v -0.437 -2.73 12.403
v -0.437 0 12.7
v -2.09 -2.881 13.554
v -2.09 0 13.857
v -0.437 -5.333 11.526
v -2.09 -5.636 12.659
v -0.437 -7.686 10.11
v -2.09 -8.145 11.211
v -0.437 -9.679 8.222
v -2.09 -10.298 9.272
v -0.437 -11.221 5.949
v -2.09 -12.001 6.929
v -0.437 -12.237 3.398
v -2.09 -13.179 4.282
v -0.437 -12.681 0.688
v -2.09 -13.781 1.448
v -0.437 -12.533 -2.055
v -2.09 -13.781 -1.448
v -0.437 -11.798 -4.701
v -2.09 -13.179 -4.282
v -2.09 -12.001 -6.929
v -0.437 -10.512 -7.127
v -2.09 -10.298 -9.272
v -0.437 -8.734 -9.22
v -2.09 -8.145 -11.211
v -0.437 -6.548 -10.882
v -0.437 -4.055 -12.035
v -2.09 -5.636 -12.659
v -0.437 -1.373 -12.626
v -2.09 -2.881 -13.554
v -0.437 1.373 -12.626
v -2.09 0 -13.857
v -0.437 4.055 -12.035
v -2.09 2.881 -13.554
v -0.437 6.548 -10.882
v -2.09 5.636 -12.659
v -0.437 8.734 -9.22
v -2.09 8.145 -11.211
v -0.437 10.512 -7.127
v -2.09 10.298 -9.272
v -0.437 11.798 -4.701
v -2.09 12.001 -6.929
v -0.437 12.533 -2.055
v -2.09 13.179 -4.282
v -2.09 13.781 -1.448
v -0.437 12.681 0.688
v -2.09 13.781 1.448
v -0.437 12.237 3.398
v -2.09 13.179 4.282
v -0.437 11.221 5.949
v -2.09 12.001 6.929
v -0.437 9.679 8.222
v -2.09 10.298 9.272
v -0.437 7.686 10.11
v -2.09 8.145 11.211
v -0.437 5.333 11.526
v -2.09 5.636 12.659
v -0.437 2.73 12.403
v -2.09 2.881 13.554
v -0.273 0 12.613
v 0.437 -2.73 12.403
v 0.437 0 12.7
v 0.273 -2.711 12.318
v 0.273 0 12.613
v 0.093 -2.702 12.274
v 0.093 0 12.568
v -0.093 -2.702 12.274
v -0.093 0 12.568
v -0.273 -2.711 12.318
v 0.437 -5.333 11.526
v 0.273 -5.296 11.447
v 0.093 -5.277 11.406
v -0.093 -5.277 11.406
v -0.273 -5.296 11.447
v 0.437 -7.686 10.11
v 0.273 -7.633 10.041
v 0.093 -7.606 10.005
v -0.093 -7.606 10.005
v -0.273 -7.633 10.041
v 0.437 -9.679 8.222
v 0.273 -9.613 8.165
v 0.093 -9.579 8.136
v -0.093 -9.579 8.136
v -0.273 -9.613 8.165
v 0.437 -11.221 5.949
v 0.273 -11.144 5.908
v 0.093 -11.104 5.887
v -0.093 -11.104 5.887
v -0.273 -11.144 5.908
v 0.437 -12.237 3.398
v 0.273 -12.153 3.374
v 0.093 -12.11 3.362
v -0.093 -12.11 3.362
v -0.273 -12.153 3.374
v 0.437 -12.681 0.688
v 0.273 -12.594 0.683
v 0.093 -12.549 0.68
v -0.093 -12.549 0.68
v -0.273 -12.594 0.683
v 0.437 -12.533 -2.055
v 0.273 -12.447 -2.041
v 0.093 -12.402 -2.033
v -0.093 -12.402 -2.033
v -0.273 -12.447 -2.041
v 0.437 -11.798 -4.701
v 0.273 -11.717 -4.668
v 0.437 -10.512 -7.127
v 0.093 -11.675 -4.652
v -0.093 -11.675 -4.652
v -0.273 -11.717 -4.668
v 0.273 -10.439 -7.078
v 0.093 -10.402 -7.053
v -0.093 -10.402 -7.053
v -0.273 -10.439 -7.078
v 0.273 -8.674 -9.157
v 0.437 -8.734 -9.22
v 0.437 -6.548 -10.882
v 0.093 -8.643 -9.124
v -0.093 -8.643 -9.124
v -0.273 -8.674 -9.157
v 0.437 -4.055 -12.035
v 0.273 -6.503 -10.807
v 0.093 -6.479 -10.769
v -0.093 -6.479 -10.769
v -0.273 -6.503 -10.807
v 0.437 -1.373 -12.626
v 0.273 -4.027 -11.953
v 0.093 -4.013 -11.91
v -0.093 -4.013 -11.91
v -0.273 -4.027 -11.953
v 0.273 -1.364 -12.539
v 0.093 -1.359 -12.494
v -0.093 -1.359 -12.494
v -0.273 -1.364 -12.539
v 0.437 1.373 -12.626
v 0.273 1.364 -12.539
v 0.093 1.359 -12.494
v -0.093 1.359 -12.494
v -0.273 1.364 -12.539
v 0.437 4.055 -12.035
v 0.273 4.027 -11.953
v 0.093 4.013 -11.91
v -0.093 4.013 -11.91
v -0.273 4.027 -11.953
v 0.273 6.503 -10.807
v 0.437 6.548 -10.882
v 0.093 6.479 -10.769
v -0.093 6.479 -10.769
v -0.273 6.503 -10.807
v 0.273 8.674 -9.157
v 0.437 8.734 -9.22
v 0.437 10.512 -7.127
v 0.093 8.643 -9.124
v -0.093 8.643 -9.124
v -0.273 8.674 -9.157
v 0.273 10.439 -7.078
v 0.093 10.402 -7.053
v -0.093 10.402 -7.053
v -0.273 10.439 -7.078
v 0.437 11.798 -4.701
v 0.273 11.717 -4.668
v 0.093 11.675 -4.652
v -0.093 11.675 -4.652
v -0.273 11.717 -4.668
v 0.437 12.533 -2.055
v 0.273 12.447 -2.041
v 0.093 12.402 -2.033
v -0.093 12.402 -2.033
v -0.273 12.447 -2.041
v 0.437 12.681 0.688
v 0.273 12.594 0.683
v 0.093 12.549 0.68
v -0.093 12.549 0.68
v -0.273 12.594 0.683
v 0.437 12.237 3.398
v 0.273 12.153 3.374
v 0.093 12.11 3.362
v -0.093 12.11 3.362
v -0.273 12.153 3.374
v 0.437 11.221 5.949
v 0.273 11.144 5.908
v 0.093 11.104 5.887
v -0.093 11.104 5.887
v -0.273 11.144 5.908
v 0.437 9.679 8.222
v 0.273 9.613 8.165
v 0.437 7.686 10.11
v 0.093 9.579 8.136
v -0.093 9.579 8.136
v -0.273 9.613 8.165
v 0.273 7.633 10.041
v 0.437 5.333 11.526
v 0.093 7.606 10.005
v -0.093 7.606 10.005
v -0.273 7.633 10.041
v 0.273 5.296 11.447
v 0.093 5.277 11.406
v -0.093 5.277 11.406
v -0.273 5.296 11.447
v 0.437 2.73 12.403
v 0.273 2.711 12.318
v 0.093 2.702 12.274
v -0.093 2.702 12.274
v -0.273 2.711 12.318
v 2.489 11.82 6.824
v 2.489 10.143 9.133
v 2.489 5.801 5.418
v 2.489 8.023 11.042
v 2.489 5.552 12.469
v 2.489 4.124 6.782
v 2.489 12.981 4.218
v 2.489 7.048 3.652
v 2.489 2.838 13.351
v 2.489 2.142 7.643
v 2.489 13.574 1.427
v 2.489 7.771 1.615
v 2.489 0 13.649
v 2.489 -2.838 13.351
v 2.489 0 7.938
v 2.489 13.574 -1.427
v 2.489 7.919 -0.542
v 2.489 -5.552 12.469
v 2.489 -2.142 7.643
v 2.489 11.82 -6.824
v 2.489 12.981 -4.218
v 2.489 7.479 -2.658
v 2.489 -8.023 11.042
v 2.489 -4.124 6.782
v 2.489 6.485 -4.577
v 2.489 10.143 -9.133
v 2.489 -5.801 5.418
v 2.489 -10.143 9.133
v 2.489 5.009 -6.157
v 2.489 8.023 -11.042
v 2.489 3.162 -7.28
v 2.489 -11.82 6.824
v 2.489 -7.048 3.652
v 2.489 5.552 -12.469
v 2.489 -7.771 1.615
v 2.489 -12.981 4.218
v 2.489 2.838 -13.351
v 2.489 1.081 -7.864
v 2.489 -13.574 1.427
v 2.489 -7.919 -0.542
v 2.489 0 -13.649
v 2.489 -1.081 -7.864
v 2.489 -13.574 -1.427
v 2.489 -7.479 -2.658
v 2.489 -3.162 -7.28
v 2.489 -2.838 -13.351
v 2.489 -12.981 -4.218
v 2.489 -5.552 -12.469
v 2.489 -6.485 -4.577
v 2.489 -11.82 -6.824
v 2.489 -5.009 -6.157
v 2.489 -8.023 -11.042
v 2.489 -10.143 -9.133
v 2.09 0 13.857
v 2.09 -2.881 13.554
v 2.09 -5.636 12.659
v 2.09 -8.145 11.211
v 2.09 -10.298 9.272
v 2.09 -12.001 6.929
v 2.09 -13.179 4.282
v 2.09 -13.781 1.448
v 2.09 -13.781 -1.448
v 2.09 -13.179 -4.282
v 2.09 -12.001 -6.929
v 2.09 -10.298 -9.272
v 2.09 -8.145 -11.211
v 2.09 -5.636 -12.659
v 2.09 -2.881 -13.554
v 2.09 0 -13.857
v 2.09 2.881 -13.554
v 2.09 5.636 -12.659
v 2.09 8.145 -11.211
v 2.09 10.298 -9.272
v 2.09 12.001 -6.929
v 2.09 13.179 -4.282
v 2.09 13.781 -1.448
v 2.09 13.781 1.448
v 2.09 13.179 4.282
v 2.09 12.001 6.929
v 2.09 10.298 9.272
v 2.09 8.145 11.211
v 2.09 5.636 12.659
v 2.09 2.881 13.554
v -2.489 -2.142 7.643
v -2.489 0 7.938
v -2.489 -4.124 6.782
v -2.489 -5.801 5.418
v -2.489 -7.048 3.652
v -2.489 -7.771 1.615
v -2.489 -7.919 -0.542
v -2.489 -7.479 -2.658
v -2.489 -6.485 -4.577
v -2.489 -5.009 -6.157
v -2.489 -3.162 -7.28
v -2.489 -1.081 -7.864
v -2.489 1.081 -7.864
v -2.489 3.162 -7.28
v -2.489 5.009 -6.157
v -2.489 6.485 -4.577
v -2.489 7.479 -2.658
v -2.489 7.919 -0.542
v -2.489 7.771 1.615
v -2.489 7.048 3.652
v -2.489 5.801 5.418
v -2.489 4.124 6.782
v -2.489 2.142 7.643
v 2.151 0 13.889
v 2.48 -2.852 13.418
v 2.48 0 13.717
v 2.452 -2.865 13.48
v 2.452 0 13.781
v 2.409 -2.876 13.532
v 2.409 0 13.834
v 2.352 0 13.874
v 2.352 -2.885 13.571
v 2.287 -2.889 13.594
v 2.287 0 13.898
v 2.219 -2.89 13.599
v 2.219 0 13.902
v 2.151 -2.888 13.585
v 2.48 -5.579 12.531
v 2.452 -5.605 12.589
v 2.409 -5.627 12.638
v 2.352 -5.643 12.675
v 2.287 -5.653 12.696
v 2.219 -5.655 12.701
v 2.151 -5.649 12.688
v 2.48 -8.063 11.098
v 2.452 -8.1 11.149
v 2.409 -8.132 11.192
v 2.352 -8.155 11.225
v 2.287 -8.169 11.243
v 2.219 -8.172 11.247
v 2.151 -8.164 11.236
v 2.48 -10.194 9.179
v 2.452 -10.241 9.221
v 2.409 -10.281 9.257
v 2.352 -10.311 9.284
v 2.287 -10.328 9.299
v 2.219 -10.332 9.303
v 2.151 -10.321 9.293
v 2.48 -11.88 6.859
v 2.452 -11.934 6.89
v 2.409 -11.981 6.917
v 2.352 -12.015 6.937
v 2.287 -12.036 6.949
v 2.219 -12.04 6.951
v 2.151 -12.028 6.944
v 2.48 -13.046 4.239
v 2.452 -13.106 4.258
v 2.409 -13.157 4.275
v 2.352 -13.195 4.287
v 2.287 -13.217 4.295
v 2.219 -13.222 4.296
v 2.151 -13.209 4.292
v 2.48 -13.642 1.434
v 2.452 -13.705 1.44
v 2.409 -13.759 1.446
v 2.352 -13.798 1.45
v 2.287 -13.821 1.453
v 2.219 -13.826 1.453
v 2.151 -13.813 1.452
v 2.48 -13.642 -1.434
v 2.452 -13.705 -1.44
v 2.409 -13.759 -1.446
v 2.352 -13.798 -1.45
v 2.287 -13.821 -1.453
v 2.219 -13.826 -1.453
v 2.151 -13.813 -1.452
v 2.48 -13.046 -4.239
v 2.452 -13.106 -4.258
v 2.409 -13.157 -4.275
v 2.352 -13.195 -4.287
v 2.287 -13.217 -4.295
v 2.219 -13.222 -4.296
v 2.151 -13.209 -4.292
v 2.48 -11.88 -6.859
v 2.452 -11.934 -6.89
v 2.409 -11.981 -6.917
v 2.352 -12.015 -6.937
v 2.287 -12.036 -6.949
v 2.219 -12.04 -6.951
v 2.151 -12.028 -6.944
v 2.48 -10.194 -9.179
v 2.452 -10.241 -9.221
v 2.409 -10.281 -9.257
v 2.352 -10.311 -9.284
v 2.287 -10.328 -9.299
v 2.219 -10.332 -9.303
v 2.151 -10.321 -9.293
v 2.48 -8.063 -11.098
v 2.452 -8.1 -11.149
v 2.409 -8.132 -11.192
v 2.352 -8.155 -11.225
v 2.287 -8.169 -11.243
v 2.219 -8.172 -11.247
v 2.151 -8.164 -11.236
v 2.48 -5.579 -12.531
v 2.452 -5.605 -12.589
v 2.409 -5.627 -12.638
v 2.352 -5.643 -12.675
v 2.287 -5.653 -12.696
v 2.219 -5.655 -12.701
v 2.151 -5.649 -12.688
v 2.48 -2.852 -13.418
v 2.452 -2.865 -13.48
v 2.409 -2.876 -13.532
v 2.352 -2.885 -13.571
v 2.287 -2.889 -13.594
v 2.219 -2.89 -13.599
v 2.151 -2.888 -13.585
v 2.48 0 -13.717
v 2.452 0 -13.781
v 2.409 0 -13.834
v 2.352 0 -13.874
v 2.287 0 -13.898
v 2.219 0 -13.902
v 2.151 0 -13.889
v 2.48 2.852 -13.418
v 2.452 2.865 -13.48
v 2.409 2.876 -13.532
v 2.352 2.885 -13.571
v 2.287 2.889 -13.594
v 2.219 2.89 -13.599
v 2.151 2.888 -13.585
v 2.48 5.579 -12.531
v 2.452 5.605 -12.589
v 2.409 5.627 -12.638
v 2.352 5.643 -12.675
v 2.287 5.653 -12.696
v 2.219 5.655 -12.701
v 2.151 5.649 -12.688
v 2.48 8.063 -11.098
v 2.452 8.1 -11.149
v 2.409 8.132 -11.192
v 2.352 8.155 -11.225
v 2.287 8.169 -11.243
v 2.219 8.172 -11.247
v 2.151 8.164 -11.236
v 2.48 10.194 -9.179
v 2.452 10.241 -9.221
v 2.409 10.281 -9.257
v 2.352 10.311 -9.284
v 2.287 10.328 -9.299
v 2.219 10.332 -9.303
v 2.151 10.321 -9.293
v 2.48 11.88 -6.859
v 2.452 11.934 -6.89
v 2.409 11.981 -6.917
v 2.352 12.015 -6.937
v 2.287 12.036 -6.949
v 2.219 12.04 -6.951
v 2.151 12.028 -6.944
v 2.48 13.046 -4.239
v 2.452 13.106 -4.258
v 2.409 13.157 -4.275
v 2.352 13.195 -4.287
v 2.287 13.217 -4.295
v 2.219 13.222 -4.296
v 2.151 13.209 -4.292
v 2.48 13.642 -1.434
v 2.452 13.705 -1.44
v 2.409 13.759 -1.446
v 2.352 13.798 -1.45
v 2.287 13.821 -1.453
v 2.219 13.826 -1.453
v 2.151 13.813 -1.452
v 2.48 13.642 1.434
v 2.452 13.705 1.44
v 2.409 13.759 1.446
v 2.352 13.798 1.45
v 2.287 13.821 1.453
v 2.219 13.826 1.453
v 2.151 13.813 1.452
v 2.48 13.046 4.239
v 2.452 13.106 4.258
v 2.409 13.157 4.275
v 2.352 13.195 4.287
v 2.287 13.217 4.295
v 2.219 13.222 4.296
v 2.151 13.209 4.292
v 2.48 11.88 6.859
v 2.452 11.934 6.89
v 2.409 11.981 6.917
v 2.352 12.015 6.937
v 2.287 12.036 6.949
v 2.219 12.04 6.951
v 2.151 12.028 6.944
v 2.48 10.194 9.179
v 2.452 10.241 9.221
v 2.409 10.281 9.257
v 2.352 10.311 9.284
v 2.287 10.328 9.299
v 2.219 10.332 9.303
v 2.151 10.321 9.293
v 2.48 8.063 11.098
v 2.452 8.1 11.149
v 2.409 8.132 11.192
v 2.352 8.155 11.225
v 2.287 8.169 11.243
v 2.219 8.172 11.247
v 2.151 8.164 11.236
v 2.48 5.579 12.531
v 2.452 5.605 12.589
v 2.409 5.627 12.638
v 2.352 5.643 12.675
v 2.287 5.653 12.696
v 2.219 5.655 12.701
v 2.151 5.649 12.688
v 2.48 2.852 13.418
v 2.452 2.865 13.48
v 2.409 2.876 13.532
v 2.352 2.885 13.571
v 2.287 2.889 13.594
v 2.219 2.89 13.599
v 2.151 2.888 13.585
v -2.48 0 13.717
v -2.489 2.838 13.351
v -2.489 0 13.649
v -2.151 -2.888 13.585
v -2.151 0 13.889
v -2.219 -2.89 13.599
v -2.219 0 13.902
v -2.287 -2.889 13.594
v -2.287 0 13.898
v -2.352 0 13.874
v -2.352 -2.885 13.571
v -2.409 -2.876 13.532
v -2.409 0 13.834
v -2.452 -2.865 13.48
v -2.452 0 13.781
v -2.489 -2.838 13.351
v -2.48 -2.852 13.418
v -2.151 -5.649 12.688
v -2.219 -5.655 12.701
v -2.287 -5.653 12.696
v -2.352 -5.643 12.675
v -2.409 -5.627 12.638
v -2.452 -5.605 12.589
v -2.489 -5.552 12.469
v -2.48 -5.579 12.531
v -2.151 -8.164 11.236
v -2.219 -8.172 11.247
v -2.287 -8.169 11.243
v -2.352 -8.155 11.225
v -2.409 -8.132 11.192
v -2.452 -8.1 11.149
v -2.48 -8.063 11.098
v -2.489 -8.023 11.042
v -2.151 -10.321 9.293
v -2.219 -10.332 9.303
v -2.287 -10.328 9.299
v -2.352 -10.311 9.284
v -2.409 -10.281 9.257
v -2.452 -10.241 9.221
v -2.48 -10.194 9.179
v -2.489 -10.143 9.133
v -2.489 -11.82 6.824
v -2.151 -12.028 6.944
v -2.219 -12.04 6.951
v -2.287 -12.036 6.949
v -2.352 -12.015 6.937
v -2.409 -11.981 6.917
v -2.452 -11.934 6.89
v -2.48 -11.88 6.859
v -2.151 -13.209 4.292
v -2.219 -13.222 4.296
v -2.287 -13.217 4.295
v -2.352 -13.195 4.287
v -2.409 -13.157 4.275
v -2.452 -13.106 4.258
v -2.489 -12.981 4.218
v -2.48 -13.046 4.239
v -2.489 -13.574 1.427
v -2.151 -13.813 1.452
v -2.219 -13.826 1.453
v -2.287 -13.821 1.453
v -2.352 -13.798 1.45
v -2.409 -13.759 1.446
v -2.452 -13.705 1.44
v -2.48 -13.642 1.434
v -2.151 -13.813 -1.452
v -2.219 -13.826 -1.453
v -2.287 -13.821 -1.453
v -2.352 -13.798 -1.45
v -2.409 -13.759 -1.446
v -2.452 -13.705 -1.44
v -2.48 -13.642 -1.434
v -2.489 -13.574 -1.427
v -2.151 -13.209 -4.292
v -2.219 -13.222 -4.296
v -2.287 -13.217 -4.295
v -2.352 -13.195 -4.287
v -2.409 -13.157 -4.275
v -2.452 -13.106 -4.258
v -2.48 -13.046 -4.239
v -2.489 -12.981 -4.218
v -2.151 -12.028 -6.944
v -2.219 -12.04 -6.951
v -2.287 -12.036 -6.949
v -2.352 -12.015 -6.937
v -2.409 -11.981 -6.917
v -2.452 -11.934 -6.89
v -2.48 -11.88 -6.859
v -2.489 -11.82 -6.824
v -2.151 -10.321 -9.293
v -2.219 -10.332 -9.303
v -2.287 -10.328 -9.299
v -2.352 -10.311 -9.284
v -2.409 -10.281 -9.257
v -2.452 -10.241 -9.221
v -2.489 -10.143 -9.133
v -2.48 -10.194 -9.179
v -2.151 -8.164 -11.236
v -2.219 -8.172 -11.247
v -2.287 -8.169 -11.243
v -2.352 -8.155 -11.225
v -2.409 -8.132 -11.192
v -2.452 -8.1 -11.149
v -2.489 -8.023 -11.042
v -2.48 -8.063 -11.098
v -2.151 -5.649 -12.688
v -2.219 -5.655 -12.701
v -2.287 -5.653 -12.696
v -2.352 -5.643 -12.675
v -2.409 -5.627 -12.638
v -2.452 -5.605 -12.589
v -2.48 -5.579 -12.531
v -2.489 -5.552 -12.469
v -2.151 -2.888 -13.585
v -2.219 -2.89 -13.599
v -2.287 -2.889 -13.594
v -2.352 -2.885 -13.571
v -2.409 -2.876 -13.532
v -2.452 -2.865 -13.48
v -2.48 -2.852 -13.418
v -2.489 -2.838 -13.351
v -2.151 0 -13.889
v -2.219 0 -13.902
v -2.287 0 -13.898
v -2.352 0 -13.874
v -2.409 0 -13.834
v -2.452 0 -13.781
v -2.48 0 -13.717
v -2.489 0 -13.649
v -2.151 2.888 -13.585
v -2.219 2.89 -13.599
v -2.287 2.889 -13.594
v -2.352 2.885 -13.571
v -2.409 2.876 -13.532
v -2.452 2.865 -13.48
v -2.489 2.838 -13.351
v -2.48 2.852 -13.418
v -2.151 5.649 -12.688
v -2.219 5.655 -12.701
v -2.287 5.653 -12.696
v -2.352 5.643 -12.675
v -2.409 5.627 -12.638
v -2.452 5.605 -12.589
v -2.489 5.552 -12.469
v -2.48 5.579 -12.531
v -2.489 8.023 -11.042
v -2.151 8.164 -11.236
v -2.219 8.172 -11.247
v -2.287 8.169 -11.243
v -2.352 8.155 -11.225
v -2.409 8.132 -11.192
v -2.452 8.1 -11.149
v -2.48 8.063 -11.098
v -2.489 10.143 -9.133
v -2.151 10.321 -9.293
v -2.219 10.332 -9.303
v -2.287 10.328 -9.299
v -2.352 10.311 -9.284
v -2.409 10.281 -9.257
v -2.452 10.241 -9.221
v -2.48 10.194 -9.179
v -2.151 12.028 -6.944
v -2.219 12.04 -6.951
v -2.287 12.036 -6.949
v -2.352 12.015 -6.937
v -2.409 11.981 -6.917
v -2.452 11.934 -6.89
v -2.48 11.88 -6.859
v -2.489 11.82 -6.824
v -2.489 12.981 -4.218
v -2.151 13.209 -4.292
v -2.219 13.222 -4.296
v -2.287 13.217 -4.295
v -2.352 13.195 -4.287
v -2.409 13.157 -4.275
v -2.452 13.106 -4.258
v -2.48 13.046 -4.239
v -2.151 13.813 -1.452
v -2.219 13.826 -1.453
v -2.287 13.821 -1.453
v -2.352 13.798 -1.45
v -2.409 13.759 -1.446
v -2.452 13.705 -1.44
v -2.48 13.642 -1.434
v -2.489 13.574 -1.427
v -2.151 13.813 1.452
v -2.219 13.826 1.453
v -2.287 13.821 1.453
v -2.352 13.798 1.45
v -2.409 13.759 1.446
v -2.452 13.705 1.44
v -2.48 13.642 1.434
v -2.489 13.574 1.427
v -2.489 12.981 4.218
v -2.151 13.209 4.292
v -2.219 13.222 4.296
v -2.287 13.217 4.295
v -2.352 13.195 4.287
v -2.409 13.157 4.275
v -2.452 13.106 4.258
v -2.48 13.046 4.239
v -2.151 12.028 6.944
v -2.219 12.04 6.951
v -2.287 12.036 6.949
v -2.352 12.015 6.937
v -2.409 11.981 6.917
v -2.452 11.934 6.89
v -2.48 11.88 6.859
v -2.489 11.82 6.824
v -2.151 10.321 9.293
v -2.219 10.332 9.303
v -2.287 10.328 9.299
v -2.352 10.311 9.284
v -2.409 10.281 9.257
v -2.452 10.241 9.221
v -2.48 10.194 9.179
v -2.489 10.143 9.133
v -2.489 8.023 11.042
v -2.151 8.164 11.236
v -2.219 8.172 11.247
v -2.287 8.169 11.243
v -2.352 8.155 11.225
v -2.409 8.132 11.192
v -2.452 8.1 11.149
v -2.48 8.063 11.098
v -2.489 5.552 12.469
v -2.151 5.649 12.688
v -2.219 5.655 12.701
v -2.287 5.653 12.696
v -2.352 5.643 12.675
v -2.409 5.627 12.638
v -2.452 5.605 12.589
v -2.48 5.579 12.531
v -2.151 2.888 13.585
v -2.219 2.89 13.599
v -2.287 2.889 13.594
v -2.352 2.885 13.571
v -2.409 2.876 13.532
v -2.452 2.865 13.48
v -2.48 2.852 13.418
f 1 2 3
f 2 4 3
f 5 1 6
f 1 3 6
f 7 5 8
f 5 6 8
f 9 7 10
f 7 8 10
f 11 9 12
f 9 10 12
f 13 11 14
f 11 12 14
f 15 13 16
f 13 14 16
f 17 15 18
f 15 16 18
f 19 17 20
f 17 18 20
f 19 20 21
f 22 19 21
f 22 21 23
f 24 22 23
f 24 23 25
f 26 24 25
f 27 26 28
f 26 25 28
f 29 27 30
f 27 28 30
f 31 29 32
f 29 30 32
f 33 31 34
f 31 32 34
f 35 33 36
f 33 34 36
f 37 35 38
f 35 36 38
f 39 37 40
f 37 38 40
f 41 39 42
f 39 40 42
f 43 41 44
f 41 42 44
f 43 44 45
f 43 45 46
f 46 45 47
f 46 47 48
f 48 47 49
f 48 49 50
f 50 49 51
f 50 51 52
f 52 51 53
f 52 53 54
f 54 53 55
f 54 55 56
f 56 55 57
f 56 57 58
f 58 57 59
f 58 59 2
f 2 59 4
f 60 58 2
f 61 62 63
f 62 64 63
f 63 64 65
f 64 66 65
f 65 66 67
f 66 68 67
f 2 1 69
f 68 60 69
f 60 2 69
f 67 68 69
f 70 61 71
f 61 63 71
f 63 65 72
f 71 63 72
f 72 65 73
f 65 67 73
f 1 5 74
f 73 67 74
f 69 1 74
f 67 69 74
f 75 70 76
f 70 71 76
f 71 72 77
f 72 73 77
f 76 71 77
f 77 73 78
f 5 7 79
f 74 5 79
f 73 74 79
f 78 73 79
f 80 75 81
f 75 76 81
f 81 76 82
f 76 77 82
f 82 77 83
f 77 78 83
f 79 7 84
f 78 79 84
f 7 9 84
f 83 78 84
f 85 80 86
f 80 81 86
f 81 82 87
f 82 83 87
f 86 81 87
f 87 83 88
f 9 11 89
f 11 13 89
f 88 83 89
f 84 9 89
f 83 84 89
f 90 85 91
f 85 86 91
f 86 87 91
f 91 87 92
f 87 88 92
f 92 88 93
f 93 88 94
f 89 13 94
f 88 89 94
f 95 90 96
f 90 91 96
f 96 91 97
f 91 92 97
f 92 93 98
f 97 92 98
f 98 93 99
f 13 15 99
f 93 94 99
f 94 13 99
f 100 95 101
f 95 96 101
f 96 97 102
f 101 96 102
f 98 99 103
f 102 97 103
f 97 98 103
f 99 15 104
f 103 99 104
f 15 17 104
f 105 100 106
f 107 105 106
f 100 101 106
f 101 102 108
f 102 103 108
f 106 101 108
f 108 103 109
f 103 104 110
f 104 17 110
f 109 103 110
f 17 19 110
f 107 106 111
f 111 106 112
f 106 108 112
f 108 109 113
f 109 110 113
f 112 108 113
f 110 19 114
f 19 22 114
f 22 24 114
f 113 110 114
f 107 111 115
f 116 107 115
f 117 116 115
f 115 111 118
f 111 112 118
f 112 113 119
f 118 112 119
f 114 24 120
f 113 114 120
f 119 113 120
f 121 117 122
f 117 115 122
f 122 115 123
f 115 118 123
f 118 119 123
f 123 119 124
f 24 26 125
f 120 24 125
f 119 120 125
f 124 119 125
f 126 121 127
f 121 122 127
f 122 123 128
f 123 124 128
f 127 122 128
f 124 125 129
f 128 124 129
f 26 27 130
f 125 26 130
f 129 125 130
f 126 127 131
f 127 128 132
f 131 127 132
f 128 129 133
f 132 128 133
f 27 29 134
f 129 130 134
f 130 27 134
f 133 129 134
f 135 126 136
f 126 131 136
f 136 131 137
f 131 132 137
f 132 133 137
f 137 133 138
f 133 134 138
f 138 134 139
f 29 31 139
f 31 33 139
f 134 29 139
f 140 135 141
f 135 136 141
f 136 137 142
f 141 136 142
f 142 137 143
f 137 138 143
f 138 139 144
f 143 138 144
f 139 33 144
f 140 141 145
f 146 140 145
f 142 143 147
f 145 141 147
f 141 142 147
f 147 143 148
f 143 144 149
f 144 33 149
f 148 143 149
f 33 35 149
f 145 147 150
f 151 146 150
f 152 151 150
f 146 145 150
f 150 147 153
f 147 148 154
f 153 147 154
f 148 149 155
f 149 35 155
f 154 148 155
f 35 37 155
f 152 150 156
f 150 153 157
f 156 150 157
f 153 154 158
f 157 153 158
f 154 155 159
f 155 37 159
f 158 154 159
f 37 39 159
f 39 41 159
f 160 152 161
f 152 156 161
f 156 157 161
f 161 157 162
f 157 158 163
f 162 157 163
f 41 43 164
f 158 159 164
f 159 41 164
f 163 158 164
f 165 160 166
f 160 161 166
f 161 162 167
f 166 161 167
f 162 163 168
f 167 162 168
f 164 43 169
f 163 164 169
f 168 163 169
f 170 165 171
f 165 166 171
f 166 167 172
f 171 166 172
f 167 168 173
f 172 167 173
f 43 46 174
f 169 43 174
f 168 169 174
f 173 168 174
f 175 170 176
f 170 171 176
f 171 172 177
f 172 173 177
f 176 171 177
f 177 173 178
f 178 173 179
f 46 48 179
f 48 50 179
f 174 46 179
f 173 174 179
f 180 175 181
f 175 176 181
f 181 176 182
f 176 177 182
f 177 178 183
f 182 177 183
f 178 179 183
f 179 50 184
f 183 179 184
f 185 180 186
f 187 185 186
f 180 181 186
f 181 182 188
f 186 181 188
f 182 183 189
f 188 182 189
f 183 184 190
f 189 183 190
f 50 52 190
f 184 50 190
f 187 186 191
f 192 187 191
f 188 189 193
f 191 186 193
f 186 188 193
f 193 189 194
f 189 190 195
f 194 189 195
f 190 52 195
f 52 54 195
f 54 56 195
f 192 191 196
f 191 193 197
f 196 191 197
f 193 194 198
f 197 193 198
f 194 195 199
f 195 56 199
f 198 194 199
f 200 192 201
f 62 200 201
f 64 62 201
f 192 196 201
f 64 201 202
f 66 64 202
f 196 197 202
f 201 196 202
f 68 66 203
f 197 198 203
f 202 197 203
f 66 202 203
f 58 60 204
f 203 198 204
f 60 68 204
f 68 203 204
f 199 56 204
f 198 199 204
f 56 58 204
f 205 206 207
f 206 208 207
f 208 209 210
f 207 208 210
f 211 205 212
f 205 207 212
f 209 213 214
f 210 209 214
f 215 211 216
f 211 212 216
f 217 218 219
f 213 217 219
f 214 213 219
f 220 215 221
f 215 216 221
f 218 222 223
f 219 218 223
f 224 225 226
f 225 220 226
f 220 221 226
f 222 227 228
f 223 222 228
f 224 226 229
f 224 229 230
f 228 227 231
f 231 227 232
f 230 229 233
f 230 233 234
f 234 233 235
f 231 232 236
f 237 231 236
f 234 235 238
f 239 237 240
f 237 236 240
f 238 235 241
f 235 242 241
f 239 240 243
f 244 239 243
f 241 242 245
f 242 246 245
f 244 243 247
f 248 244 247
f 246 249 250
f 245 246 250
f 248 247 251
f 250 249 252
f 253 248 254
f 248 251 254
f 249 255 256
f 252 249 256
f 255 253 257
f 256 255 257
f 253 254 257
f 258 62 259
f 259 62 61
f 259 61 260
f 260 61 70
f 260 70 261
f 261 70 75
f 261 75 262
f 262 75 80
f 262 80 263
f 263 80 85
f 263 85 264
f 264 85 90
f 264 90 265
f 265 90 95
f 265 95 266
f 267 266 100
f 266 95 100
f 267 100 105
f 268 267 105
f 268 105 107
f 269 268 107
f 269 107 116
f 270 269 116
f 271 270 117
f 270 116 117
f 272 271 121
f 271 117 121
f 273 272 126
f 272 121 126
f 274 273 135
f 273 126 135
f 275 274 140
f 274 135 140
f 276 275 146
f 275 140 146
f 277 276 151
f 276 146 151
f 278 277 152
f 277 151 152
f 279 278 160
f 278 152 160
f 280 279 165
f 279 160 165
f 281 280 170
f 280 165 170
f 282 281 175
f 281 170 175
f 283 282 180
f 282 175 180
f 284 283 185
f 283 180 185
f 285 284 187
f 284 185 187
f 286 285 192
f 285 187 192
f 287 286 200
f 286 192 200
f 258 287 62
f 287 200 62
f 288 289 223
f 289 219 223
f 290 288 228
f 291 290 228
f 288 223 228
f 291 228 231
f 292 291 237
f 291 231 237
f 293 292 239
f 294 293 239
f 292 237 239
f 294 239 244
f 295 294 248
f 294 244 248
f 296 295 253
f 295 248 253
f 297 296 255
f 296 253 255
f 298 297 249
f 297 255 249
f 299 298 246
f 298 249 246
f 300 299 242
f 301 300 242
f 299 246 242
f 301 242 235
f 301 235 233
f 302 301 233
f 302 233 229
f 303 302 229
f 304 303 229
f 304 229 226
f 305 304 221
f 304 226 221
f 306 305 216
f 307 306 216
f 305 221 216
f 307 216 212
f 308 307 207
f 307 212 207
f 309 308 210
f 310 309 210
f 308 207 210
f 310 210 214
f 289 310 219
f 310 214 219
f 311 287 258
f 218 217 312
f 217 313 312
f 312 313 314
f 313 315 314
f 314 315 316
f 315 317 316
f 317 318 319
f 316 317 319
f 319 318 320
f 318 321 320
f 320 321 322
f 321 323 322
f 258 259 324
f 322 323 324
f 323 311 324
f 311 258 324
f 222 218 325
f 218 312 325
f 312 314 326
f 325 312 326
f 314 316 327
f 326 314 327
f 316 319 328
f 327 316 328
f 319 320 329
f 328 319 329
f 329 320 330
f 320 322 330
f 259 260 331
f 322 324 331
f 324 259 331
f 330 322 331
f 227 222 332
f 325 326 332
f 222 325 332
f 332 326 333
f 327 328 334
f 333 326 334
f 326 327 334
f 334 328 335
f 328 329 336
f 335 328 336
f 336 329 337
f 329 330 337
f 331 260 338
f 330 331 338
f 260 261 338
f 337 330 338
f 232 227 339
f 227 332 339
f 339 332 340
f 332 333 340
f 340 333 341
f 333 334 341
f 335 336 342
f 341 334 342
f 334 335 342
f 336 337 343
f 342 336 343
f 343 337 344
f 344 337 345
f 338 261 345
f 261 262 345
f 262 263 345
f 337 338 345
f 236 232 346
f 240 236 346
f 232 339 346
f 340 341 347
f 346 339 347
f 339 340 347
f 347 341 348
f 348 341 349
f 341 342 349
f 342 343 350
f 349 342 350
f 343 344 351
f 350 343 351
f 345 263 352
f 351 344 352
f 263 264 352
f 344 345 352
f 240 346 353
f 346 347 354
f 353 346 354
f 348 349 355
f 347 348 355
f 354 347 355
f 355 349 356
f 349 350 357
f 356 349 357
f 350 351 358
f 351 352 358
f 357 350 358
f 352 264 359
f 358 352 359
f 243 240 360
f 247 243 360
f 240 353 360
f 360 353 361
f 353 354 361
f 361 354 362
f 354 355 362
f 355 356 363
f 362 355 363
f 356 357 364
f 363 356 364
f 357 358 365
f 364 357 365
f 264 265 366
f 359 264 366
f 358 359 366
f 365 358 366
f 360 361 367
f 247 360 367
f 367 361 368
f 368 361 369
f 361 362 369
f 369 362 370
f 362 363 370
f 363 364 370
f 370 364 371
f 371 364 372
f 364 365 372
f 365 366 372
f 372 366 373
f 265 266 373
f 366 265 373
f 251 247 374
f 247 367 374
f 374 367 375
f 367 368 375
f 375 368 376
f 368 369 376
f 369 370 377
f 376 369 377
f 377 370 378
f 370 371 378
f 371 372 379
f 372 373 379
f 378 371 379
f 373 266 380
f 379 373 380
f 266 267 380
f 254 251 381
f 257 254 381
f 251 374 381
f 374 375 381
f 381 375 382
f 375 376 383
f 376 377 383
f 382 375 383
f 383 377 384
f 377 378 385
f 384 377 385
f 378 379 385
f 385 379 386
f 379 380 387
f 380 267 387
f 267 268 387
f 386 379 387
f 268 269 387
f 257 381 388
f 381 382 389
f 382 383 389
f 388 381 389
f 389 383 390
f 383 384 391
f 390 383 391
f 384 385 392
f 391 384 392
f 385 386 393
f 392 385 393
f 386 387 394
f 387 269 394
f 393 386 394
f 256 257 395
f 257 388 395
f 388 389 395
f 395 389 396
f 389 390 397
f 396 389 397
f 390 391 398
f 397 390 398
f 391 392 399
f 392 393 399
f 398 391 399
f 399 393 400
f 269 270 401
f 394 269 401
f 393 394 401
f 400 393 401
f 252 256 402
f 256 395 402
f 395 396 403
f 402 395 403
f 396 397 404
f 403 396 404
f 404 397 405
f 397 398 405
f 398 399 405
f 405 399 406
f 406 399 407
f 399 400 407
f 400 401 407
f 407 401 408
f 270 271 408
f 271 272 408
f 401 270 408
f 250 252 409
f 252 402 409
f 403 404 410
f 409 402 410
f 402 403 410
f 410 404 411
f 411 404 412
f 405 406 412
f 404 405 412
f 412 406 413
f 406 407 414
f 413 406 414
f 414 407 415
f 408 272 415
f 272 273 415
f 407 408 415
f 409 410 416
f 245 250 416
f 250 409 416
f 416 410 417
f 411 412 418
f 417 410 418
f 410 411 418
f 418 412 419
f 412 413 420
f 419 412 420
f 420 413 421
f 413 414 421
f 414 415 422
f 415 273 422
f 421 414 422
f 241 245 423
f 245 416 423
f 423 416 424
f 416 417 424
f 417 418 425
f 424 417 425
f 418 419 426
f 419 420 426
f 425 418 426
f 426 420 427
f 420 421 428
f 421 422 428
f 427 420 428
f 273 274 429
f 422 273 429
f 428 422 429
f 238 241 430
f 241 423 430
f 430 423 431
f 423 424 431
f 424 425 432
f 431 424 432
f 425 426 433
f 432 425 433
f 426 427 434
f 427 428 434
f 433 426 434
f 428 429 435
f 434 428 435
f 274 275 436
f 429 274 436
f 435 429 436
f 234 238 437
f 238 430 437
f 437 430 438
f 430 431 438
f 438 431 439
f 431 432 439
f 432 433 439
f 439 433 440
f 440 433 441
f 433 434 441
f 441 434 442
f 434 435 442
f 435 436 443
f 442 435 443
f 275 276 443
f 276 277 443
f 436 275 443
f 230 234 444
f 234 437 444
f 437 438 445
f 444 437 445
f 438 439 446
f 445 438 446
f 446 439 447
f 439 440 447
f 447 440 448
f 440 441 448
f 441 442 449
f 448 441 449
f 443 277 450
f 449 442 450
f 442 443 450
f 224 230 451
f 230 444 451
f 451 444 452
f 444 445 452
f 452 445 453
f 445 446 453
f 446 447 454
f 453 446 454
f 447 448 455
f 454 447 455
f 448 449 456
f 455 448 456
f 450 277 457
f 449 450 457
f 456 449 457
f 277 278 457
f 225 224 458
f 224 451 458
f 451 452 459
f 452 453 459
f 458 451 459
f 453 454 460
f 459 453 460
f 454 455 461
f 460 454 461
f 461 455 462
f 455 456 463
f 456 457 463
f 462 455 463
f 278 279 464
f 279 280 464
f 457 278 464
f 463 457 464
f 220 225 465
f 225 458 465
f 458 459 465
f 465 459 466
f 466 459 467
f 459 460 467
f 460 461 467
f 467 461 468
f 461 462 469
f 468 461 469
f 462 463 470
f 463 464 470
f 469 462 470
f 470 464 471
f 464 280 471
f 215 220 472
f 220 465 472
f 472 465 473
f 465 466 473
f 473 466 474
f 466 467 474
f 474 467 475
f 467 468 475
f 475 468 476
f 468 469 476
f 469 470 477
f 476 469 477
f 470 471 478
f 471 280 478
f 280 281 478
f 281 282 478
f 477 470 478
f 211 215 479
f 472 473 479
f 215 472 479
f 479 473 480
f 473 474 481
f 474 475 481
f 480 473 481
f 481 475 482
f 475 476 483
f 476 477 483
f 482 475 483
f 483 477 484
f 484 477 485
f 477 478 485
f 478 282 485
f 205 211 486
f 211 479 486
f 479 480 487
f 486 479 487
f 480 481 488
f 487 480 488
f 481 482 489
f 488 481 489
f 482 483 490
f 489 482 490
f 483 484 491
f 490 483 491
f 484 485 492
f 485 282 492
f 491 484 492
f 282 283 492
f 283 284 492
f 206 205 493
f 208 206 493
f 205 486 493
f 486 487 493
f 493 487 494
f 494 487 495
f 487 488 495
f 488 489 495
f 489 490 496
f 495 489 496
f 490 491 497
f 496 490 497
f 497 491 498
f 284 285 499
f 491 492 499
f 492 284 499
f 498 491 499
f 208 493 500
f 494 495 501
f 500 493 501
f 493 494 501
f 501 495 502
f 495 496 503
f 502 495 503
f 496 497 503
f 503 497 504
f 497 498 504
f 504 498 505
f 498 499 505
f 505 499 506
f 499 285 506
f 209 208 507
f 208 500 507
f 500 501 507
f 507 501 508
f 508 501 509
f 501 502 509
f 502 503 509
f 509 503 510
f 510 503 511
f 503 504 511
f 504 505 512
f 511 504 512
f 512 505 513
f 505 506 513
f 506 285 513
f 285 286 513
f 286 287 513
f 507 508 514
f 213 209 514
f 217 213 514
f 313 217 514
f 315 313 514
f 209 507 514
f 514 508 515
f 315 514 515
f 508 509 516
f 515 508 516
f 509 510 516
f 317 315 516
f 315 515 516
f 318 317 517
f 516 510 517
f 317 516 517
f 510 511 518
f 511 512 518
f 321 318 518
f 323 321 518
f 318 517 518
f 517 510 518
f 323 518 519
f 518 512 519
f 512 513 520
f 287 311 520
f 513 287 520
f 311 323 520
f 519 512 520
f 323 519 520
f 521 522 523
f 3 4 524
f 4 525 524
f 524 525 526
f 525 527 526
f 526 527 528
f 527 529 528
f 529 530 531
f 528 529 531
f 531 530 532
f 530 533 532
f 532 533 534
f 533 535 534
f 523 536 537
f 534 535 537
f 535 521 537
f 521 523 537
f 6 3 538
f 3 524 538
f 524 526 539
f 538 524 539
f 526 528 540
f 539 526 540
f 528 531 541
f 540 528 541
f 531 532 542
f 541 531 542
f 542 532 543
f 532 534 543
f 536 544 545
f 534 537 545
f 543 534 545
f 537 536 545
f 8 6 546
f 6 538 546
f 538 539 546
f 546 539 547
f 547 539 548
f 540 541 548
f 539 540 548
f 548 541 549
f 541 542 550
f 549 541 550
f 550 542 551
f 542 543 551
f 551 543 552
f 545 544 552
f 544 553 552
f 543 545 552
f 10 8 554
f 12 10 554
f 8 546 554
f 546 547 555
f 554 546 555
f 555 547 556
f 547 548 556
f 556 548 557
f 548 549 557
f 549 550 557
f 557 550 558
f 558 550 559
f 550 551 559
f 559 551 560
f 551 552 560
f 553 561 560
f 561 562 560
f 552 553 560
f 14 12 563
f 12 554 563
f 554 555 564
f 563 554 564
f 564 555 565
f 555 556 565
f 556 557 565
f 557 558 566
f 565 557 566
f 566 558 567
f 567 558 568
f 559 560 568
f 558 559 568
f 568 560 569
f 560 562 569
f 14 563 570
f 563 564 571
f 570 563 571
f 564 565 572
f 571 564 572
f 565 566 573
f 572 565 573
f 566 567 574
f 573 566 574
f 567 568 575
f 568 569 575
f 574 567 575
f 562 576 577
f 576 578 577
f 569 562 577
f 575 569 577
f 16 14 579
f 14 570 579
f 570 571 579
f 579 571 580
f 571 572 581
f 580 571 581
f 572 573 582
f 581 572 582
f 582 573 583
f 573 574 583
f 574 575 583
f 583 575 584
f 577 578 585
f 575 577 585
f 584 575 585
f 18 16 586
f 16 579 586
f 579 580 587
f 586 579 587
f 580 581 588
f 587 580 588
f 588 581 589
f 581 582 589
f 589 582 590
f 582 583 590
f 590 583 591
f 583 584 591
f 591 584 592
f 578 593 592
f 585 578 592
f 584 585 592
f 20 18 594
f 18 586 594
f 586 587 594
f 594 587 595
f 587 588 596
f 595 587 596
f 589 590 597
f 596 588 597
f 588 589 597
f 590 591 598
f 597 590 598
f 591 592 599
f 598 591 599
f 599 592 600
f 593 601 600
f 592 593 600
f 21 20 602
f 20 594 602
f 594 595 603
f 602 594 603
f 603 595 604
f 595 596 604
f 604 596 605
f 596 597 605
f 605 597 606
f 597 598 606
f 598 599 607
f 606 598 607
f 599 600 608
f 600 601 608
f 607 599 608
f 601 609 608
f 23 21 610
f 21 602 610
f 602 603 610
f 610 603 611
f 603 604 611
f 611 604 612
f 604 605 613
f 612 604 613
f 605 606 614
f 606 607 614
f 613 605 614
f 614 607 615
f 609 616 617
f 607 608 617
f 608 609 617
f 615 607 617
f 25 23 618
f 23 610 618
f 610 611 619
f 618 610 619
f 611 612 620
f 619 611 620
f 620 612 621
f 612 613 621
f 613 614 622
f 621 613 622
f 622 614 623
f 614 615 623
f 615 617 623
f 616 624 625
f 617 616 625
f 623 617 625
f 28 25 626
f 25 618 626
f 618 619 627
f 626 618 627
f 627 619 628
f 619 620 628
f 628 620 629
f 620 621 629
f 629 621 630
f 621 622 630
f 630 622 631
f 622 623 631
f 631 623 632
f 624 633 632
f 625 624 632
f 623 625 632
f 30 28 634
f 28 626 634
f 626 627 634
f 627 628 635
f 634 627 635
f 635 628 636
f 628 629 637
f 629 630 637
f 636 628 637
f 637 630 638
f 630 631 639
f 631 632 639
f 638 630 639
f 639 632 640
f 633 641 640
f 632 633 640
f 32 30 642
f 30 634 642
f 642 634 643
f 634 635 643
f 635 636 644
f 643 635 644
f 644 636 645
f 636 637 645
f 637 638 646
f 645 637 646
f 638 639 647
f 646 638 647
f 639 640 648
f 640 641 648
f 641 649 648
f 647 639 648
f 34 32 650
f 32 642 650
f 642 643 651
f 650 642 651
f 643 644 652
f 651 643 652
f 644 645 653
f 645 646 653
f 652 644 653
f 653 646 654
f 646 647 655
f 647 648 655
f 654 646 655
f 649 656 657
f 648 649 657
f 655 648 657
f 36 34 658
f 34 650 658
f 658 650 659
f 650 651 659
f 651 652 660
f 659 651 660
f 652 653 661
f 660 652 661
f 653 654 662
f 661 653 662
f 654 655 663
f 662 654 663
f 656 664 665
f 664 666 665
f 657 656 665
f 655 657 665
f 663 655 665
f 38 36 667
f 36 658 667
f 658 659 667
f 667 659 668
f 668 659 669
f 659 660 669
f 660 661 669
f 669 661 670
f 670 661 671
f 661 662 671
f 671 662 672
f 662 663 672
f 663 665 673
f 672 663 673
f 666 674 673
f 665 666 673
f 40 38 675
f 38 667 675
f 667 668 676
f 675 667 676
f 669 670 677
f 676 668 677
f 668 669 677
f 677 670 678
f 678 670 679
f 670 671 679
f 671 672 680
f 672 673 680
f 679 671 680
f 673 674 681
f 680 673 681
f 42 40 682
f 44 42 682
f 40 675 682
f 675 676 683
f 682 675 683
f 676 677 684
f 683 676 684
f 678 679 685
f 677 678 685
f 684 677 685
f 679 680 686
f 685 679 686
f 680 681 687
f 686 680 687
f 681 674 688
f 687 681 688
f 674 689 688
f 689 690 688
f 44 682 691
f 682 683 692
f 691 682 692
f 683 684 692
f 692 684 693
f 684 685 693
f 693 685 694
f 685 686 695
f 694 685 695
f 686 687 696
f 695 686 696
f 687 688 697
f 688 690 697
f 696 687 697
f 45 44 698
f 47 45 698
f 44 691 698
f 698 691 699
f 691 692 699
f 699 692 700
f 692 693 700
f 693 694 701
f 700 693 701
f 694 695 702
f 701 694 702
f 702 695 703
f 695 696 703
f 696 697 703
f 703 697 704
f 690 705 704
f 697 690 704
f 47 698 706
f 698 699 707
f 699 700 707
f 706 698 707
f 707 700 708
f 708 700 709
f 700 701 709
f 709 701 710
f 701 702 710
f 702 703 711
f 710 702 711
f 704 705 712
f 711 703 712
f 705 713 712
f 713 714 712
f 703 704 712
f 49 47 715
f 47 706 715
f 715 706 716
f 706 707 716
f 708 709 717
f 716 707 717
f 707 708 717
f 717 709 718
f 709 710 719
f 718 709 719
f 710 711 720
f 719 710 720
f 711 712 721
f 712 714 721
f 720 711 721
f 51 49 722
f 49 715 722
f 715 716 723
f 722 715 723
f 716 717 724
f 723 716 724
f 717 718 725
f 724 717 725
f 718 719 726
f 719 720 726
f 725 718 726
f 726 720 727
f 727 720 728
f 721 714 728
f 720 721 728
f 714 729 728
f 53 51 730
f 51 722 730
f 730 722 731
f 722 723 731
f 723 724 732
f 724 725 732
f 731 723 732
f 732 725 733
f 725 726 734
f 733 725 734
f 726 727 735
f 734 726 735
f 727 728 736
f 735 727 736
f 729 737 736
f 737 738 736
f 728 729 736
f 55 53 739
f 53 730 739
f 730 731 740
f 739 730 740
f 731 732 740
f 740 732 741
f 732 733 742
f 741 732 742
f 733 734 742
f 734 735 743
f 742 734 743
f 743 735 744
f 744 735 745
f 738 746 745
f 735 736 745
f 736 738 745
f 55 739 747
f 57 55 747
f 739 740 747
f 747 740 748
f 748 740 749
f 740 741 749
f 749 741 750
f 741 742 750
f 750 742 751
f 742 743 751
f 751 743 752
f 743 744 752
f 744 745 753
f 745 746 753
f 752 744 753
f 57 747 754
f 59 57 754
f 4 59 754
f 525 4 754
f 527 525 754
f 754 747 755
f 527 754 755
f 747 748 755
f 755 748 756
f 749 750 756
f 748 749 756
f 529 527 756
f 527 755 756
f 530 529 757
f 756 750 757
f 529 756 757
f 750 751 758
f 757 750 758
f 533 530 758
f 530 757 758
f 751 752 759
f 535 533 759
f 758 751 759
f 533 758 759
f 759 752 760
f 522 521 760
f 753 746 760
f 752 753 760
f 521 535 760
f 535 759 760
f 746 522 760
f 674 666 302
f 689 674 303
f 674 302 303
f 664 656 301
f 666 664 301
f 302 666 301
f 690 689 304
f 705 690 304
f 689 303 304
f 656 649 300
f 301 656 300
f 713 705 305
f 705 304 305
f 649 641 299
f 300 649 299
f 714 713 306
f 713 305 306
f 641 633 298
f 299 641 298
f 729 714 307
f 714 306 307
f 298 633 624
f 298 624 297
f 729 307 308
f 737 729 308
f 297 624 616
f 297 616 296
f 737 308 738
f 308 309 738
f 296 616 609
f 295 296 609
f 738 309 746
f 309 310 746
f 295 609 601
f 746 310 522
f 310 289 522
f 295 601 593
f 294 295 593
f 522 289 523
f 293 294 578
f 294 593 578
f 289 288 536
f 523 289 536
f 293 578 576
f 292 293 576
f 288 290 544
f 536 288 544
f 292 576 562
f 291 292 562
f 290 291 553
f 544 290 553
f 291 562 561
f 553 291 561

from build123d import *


with BuildPart() as f1:
    # F0 (on Front) → F1 (revolve)
    with BuildSketch(Plane.XZ):
        with BuildLine():
            Line((2.089512, 13.857055), (0.437065, 12.7))
            ThreePointArc((0.437065, 12.7), (0, 12.562194), (-0.437065, 12.7))
            Line((-0.437065, 12.7), (-2.089512, 13.857055))
            ThreePointArc((-2.089512, 13.857055), (-2.352484, 13.874292), (-2.4892, 13.648991))
            Line((-2.4892, 13.648991), (-2.4892, 7.9375))
            Line((-2.4892, 7.9375), (0, 7.9375))
            Line((0, 7.9375), (2.4892, 7.9375))
            Line((2.4892, 7.9375), (2.4892, 13.648991))
            ThreePointArc((2.4892, 13.648991), (2.352484, 13.874292), (2.089512, 13.857055))
        make_face()
    revolve(axis=Axis((2.944905, 0, 0), (1, 0, 0)))


solid = f1.part
